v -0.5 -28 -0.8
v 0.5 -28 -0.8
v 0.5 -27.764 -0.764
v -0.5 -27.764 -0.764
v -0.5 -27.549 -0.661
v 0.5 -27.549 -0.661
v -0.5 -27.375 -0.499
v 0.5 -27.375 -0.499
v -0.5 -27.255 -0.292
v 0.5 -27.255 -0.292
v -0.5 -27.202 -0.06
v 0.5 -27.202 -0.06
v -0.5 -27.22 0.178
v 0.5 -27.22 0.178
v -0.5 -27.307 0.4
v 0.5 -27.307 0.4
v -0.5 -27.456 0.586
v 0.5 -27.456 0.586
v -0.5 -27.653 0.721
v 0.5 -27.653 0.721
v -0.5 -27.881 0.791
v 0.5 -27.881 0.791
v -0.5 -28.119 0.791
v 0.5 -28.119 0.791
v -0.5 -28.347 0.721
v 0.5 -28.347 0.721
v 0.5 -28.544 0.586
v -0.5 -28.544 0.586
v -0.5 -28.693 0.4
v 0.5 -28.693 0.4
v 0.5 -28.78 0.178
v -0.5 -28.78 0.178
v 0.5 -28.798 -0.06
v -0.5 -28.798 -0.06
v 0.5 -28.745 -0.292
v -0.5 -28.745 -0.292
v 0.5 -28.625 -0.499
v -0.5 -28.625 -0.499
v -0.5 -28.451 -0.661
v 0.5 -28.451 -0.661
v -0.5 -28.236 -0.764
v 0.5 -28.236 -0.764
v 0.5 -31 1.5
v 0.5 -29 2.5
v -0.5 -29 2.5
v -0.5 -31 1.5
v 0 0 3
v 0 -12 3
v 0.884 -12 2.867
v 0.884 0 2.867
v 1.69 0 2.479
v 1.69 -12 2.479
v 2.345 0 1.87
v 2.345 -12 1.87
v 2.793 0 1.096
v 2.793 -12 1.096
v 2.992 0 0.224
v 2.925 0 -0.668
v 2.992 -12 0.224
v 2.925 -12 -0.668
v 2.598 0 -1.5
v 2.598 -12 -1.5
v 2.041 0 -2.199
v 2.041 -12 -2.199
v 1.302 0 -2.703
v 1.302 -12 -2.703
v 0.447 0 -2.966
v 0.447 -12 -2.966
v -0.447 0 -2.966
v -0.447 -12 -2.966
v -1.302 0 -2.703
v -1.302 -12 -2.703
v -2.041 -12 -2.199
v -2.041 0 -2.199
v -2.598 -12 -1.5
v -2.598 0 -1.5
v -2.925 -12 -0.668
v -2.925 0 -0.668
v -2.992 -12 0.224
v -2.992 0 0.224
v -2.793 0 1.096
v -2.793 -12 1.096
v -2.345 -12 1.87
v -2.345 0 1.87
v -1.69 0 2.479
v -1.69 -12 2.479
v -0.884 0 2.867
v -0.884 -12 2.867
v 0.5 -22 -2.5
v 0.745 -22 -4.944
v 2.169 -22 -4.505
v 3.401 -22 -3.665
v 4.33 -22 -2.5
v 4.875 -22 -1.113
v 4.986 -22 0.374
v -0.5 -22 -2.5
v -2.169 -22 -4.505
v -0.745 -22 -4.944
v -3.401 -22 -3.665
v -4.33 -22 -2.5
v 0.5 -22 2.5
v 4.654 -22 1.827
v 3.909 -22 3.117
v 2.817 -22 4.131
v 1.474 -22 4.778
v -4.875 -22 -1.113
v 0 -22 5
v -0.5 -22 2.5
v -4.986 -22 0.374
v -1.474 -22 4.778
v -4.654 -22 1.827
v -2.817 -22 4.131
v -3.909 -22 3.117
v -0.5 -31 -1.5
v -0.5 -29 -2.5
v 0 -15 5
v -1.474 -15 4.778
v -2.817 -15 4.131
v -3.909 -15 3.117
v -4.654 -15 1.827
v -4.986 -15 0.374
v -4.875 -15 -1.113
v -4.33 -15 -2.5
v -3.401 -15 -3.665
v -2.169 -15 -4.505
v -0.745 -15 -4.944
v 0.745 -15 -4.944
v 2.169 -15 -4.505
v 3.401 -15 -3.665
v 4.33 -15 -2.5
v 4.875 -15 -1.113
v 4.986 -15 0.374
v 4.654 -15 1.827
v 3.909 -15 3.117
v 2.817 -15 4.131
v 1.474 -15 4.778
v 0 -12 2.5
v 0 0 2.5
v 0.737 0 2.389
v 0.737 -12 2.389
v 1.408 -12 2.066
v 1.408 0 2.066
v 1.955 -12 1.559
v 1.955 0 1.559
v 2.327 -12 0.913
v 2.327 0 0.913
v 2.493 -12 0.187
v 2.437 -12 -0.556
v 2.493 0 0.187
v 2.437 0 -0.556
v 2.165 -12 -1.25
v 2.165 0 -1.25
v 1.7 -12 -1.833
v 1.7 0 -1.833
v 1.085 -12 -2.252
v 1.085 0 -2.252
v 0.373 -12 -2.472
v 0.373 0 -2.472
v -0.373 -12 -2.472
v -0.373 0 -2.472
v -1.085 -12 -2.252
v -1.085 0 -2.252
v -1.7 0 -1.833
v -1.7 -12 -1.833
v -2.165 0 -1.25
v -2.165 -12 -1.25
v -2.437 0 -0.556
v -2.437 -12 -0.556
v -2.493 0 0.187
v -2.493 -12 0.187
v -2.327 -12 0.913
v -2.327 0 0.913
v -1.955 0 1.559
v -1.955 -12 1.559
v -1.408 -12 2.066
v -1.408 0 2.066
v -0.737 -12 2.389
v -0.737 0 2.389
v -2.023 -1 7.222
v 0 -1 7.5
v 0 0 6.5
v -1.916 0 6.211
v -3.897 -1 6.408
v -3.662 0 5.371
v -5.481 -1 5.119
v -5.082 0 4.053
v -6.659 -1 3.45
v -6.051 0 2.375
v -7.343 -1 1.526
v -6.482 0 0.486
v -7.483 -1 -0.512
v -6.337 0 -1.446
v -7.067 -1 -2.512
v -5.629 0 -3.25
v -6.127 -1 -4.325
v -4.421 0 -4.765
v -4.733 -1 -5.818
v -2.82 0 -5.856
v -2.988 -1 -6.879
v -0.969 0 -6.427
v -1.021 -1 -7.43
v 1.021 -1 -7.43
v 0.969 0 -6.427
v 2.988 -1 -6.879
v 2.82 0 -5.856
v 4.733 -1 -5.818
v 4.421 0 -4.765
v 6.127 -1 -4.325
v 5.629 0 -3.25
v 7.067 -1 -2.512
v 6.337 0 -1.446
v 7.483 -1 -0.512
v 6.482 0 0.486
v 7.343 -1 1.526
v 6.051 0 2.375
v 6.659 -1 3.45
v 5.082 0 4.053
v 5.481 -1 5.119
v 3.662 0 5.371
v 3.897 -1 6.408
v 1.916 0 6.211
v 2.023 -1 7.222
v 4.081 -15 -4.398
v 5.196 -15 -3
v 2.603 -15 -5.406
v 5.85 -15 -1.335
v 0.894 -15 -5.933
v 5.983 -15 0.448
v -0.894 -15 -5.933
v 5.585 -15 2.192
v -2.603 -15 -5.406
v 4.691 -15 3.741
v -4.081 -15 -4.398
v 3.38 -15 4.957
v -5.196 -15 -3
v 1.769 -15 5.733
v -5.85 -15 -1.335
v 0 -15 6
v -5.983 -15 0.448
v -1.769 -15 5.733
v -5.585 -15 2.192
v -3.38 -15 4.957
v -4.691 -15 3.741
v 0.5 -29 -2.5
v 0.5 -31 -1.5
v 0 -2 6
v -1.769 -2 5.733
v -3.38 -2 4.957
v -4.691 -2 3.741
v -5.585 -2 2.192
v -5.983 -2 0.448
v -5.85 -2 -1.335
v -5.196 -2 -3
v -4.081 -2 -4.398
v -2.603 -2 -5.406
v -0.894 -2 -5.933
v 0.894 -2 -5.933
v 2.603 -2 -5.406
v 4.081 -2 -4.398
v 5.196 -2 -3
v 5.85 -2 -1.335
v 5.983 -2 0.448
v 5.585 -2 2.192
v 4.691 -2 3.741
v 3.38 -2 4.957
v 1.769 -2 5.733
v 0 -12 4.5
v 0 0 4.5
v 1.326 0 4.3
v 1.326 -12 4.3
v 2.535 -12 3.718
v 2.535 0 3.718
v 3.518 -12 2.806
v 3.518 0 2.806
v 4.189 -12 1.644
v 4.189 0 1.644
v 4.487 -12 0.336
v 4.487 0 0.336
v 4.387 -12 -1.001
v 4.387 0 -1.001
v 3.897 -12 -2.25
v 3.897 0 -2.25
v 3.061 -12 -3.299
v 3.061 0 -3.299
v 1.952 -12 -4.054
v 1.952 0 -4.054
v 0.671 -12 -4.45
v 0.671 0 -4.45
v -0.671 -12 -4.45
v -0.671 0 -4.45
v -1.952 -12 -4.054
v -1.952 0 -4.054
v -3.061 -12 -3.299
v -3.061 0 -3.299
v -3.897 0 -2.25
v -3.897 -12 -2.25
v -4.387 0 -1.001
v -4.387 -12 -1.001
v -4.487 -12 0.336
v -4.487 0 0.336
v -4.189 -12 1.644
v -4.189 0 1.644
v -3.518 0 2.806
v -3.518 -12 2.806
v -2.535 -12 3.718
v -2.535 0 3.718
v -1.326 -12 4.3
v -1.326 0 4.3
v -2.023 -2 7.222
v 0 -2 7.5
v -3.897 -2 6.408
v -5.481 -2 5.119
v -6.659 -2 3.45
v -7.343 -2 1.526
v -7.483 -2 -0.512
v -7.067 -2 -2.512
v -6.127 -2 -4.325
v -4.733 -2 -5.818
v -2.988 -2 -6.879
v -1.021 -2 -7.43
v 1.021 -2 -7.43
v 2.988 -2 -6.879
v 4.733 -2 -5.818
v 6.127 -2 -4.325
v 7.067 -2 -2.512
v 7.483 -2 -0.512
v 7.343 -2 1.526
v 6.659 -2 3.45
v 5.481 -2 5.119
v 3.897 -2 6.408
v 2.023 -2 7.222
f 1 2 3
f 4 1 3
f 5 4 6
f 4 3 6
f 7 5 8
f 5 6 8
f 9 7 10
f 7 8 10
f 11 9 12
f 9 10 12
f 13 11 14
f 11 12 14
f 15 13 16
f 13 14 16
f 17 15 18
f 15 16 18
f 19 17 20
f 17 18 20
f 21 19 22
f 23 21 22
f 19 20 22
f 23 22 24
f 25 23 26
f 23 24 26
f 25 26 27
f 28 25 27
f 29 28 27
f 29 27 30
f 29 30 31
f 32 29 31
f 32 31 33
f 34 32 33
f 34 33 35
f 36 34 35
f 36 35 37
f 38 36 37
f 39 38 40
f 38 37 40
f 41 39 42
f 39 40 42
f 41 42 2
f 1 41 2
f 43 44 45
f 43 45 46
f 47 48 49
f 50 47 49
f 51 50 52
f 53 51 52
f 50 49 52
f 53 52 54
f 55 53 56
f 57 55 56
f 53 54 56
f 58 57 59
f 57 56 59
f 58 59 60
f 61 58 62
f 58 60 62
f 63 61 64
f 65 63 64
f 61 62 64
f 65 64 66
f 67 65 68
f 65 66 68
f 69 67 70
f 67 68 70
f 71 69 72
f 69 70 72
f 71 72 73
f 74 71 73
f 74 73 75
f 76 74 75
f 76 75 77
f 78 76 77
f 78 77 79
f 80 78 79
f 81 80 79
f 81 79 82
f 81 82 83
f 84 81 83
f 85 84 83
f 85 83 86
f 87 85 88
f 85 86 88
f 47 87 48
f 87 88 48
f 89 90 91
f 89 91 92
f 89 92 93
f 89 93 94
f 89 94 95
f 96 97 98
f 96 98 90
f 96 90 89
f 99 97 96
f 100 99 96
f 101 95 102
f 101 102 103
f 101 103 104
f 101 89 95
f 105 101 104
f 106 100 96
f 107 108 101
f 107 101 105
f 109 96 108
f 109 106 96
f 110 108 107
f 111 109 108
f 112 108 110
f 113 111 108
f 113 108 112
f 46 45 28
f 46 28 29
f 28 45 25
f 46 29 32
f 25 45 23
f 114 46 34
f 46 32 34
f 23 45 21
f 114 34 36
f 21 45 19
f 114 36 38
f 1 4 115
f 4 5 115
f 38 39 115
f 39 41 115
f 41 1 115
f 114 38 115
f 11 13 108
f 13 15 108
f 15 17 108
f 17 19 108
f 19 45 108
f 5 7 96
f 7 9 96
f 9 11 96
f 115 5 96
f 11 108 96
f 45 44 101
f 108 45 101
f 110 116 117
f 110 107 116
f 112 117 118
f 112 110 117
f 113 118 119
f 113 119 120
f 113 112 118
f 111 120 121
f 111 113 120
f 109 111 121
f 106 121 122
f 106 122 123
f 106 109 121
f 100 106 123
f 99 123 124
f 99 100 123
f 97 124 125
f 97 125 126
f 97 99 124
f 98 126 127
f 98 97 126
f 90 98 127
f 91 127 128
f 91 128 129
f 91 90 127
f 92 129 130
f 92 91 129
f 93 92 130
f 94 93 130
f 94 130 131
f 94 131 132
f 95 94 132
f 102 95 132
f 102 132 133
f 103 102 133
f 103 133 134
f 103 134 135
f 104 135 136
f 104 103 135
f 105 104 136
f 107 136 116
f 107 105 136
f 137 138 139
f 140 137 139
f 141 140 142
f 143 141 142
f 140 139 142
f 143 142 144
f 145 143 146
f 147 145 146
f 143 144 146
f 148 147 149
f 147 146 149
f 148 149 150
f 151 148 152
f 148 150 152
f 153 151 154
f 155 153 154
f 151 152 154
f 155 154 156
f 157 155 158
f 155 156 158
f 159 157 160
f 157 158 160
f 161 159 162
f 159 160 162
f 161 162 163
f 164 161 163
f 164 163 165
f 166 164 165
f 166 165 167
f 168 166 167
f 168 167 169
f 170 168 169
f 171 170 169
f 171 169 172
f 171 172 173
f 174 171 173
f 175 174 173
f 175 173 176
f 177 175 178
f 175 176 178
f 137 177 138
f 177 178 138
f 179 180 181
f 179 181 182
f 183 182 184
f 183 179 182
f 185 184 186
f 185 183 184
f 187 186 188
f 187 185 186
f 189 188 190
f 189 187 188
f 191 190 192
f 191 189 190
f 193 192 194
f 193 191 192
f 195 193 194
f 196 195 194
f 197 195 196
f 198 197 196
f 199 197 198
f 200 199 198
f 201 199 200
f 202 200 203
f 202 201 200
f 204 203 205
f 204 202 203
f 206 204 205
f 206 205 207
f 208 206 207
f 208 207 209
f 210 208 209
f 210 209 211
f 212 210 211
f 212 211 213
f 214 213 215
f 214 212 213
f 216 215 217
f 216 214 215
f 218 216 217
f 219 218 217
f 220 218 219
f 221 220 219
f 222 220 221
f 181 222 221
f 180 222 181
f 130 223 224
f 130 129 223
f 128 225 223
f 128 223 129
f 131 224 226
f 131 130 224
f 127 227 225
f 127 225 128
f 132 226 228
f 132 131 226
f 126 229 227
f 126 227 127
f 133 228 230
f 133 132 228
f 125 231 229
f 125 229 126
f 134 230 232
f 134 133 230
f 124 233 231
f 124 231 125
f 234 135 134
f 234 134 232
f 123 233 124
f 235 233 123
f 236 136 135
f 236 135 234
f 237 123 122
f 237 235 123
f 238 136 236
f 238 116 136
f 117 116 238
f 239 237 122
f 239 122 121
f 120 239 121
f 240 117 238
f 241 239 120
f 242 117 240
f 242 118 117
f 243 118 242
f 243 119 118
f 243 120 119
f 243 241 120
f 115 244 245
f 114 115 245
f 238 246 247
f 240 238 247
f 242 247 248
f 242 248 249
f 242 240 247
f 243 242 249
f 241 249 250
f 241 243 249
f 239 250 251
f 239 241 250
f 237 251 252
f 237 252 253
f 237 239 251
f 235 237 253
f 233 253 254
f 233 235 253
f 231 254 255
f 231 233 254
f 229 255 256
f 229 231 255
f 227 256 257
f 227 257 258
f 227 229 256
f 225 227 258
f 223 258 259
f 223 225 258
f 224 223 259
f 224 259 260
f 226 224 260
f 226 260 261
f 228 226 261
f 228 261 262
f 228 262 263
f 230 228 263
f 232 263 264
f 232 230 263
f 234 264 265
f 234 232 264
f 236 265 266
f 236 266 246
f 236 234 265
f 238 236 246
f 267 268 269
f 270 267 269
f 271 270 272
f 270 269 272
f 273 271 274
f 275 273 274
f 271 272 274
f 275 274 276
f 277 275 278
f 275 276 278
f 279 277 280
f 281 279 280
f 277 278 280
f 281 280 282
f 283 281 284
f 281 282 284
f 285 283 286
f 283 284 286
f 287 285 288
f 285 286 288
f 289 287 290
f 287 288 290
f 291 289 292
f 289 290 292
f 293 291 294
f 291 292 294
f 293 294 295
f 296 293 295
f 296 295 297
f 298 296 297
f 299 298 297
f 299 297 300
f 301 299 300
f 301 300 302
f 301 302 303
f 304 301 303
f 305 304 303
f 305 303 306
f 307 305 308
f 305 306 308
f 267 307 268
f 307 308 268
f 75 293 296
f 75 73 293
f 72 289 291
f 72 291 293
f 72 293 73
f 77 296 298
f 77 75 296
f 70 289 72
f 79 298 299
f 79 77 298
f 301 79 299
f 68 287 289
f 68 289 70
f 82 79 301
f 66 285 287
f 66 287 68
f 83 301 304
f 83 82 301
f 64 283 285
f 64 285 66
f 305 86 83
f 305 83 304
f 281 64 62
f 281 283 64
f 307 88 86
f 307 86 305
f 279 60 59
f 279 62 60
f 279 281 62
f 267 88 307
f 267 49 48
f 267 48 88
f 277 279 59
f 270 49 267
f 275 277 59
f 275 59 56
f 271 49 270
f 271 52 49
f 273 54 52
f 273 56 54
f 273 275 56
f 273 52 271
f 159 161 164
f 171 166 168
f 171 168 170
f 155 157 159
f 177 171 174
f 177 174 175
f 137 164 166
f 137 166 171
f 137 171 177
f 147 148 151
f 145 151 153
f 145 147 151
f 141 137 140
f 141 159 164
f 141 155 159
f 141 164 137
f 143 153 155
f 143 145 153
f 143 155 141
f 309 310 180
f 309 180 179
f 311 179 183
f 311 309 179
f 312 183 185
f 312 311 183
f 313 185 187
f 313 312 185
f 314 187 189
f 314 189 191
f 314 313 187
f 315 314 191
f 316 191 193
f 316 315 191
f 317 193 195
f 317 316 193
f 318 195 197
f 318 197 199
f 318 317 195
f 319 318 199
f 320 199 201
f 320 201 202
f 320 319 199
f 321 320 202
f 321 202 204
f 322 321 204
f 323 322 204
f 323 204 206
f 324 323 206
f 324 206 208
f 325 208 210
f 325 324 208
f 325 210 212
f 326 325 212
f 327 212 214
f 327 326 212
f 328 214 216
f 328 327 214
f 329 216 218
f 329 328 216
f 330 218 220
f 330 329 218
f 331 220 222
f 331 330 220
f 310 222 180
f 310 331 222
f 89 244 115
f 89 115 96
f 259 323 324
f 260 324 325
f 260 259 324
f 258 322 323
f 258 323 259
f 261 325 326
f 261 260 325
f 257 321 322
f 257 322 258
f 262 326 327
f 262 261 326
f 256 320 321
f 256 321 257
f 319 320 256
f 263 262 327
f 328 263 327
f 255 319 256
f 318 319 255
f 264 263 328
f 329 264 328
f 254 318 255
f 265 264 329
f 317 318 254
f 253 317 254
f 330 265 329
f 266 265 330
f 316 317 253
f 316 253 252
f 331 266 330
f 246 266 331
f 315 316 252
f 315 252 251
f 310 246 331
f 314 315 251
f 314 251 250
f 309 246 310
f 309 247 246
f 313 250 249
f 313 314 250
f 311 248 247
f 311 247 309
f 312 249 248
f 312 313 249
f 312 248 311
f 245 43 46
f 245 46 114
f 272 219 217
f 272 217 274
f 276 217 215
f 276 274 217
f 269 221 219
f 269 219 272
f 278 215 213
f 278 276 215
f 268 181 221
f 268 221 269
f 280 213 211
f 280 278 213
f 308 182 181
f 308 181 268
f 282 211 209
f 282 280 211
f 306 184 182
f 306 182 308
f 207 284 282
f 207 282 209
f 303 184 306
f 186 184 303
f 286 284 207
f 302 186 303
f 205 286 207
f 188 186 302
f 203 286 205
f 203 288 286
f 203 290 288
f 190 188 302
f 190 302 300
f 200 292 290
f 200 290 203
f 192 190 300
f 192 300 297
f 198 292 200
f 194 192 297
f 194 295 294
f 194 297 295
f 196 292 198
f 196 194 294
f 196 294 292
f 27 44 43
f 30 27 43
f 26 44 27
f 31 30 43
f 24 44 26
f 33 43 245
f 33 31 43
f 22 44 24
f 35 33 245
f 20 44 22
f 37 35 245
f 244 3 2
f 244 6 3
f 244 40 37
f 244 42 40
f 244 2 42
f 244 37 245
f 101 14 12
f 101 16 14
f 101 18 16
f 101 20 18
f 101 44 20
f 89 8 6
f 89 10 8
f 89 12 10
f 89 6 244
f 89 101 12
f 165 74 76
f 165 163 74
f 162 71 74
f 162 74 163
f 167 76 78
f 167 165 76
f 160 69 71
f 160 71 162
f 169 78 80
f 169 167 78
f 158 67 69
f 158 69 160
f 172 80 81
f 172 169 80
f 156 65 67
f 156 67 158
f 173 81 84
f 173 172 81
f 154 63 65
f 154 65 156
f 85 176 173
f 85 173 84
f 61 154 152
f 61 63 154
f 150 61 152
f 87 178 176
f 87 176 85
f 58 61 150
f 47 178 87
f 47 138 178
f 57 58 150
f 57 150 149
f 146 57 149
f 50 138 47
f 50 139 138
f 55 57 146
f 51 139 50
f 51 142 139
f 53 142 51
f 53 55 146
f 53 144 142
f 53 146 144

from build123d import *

# Parameters (mm, degrees)
CHANFREIN1_SIZE         = 1
ESQUISSE2_R             = 4.5
ENL_V_MAT_EXTRU_1_DEPTH = 12
ESQUISSE3_R             = 3
BOSS_EXTRU_1_DEPTH      = 12
ESQUISSE4_R             = 2.5
ENL_V_MAT_EXTRU_2_DEPTH = 12
ESQUISSE5_W             = 5
ESQUISSE5_H             = 9
BOSS_EXTRU_2_DEPTH      = 1
ENL_V_MAT_EXTRU_3_DEPTH = 1
ENL_V_MAT_EXTRU_4_DEPTH = 1
ESQUISSE8_R             = 0.8
ENL_V_MAT_EXTRU_5_DEPTH = 1


with BuildPart() as part:
    # Esquisse1 → Base-Révolution (revolve)
    with BuildSketch(Plane(origin=(0, 0, 0), x_dir=(0, 0, -1), z_dir=(1, 0, 0)), mode=Mode.PRIVATE) as base_r_volution_sk:
        Polygon((0, 0), (7.5, 0), (7.5, -2), (6, -2), (6, -15), (5, -15), (5, -22), (0, -22), align=None)
    revolve(base_r_volution_sk.sketch.rotate(Axis((0, 10, 0), (0, -1, 0)), 180), axis=Axis((0, 10, 0), (0, -1, 0)))

    # Chanfrein1
    chanfrein1_edges = [part.edges().sort_by_distance(p)[0] for p in [
        (0, 0, -7.5),
    ]]
    chamfer(chanfrein1_edges, length=CHANFREIN1_SIZE)

    # Esquisse2 → Enlèv. mat.-Extru.1 (cut)
    with BuildSketch(Plane(origin=(0, 0, 0), x_dir=(-1, 0, 0), z_dir=(0, 1, 0))):
        with Locations(Location((0, 0, 0), (0, 0, 90))):
            Circle(ESQUISSE2_R)
    extrude(amount=-ENL_V_MAT_EXTRU_1_DEPTH, mode=Mode.SUBTRACT)

    # Esquisse3 → Boss.-Extru.1 (add)
    with BuildSketch(Plane(origin=(0, -12, 0), x_dir=(-1, 0, 0), z_dir=(0, 1, 0))):
        with Locations(Location((0, 0, 0), (0, 0, 90))):
            Circle(ESQUISSE3_R)
    extrude(amount=BOSS_EXTRU_1_DEPTH)

    # Esquisse4 → Enlèv. mat.-Extru.2 (cut)
    with BuildSketch(Plane(origin=(0, 0, 0), x_dir=(-1, 0, 0), z_dir=(0, 1, 0))):
        with Locations(Location((0, 0, 0), (0, 0, 90))):
            Circle(ESQUISSE4_R)
    extrude(amount=-ENL_V_MAT_EXTRU_2_DEPTH, mode=Mode.SUBTRACT)

    # Esquisse5 → Boss.-Extru.2 (add)
    with BuildSketch(Plane(origin=(0.5, 0, 0), x_dir=(0, 0, -1), z_dir=(1, 0, 0))):
        with Locations((0, -26.5)):
            Rectangle(ESQUISSE5_W, ESQUISSE5_H)
    extrude(amount=-BOSS_EXTRU_2_DEPTH)

    # Esquisse6 → Enlèv. mat.-Extru.3 (cut)
    with BuildSketch(Plane(origin=(0.5, 0, 0), x_dir=(0, 0, -1), z_dir=(1, 0, 0))):
        Polygon((-2.5, -29), (-1.5, -31), (-2.5, -31), align=None)
    extrude(amount=-ENL_V_MAT_EXTRU_3_DEPTH, mode=Mode.SUBTRACT)

    # Esquisse7 → Enlèv. mat.-Extru.4 (cut)
    with BuildSketch(Plane(origin=(0.5, 0, 0), x_dir=(0, 0, -1), z_dir=(1, 0, 0))):
        Polygon((2.5, -31), (2.5, -29), (1.5, -31), align=None)
    extrude(amount=-ENL_V_MAT_EXTRU_4_DEPTH, mode=Mode.SUBTRACT)

    # Esquisse8 → Enlèv. mat.-Extru.5 (cut)
    with BuildSketch(Plane(origin=(0.5, 0, 0), x_dir=(0, 0, -1), z_dir=(1, 0, 0))):
        with Locations((0, -28)):
            Circle(ESQUISSE8_R)
    extrude(amount=-ENL_V_MAT_EXTRU_5_DEPTH, mode=Mode.SUBTRACT)


solid = part.part
